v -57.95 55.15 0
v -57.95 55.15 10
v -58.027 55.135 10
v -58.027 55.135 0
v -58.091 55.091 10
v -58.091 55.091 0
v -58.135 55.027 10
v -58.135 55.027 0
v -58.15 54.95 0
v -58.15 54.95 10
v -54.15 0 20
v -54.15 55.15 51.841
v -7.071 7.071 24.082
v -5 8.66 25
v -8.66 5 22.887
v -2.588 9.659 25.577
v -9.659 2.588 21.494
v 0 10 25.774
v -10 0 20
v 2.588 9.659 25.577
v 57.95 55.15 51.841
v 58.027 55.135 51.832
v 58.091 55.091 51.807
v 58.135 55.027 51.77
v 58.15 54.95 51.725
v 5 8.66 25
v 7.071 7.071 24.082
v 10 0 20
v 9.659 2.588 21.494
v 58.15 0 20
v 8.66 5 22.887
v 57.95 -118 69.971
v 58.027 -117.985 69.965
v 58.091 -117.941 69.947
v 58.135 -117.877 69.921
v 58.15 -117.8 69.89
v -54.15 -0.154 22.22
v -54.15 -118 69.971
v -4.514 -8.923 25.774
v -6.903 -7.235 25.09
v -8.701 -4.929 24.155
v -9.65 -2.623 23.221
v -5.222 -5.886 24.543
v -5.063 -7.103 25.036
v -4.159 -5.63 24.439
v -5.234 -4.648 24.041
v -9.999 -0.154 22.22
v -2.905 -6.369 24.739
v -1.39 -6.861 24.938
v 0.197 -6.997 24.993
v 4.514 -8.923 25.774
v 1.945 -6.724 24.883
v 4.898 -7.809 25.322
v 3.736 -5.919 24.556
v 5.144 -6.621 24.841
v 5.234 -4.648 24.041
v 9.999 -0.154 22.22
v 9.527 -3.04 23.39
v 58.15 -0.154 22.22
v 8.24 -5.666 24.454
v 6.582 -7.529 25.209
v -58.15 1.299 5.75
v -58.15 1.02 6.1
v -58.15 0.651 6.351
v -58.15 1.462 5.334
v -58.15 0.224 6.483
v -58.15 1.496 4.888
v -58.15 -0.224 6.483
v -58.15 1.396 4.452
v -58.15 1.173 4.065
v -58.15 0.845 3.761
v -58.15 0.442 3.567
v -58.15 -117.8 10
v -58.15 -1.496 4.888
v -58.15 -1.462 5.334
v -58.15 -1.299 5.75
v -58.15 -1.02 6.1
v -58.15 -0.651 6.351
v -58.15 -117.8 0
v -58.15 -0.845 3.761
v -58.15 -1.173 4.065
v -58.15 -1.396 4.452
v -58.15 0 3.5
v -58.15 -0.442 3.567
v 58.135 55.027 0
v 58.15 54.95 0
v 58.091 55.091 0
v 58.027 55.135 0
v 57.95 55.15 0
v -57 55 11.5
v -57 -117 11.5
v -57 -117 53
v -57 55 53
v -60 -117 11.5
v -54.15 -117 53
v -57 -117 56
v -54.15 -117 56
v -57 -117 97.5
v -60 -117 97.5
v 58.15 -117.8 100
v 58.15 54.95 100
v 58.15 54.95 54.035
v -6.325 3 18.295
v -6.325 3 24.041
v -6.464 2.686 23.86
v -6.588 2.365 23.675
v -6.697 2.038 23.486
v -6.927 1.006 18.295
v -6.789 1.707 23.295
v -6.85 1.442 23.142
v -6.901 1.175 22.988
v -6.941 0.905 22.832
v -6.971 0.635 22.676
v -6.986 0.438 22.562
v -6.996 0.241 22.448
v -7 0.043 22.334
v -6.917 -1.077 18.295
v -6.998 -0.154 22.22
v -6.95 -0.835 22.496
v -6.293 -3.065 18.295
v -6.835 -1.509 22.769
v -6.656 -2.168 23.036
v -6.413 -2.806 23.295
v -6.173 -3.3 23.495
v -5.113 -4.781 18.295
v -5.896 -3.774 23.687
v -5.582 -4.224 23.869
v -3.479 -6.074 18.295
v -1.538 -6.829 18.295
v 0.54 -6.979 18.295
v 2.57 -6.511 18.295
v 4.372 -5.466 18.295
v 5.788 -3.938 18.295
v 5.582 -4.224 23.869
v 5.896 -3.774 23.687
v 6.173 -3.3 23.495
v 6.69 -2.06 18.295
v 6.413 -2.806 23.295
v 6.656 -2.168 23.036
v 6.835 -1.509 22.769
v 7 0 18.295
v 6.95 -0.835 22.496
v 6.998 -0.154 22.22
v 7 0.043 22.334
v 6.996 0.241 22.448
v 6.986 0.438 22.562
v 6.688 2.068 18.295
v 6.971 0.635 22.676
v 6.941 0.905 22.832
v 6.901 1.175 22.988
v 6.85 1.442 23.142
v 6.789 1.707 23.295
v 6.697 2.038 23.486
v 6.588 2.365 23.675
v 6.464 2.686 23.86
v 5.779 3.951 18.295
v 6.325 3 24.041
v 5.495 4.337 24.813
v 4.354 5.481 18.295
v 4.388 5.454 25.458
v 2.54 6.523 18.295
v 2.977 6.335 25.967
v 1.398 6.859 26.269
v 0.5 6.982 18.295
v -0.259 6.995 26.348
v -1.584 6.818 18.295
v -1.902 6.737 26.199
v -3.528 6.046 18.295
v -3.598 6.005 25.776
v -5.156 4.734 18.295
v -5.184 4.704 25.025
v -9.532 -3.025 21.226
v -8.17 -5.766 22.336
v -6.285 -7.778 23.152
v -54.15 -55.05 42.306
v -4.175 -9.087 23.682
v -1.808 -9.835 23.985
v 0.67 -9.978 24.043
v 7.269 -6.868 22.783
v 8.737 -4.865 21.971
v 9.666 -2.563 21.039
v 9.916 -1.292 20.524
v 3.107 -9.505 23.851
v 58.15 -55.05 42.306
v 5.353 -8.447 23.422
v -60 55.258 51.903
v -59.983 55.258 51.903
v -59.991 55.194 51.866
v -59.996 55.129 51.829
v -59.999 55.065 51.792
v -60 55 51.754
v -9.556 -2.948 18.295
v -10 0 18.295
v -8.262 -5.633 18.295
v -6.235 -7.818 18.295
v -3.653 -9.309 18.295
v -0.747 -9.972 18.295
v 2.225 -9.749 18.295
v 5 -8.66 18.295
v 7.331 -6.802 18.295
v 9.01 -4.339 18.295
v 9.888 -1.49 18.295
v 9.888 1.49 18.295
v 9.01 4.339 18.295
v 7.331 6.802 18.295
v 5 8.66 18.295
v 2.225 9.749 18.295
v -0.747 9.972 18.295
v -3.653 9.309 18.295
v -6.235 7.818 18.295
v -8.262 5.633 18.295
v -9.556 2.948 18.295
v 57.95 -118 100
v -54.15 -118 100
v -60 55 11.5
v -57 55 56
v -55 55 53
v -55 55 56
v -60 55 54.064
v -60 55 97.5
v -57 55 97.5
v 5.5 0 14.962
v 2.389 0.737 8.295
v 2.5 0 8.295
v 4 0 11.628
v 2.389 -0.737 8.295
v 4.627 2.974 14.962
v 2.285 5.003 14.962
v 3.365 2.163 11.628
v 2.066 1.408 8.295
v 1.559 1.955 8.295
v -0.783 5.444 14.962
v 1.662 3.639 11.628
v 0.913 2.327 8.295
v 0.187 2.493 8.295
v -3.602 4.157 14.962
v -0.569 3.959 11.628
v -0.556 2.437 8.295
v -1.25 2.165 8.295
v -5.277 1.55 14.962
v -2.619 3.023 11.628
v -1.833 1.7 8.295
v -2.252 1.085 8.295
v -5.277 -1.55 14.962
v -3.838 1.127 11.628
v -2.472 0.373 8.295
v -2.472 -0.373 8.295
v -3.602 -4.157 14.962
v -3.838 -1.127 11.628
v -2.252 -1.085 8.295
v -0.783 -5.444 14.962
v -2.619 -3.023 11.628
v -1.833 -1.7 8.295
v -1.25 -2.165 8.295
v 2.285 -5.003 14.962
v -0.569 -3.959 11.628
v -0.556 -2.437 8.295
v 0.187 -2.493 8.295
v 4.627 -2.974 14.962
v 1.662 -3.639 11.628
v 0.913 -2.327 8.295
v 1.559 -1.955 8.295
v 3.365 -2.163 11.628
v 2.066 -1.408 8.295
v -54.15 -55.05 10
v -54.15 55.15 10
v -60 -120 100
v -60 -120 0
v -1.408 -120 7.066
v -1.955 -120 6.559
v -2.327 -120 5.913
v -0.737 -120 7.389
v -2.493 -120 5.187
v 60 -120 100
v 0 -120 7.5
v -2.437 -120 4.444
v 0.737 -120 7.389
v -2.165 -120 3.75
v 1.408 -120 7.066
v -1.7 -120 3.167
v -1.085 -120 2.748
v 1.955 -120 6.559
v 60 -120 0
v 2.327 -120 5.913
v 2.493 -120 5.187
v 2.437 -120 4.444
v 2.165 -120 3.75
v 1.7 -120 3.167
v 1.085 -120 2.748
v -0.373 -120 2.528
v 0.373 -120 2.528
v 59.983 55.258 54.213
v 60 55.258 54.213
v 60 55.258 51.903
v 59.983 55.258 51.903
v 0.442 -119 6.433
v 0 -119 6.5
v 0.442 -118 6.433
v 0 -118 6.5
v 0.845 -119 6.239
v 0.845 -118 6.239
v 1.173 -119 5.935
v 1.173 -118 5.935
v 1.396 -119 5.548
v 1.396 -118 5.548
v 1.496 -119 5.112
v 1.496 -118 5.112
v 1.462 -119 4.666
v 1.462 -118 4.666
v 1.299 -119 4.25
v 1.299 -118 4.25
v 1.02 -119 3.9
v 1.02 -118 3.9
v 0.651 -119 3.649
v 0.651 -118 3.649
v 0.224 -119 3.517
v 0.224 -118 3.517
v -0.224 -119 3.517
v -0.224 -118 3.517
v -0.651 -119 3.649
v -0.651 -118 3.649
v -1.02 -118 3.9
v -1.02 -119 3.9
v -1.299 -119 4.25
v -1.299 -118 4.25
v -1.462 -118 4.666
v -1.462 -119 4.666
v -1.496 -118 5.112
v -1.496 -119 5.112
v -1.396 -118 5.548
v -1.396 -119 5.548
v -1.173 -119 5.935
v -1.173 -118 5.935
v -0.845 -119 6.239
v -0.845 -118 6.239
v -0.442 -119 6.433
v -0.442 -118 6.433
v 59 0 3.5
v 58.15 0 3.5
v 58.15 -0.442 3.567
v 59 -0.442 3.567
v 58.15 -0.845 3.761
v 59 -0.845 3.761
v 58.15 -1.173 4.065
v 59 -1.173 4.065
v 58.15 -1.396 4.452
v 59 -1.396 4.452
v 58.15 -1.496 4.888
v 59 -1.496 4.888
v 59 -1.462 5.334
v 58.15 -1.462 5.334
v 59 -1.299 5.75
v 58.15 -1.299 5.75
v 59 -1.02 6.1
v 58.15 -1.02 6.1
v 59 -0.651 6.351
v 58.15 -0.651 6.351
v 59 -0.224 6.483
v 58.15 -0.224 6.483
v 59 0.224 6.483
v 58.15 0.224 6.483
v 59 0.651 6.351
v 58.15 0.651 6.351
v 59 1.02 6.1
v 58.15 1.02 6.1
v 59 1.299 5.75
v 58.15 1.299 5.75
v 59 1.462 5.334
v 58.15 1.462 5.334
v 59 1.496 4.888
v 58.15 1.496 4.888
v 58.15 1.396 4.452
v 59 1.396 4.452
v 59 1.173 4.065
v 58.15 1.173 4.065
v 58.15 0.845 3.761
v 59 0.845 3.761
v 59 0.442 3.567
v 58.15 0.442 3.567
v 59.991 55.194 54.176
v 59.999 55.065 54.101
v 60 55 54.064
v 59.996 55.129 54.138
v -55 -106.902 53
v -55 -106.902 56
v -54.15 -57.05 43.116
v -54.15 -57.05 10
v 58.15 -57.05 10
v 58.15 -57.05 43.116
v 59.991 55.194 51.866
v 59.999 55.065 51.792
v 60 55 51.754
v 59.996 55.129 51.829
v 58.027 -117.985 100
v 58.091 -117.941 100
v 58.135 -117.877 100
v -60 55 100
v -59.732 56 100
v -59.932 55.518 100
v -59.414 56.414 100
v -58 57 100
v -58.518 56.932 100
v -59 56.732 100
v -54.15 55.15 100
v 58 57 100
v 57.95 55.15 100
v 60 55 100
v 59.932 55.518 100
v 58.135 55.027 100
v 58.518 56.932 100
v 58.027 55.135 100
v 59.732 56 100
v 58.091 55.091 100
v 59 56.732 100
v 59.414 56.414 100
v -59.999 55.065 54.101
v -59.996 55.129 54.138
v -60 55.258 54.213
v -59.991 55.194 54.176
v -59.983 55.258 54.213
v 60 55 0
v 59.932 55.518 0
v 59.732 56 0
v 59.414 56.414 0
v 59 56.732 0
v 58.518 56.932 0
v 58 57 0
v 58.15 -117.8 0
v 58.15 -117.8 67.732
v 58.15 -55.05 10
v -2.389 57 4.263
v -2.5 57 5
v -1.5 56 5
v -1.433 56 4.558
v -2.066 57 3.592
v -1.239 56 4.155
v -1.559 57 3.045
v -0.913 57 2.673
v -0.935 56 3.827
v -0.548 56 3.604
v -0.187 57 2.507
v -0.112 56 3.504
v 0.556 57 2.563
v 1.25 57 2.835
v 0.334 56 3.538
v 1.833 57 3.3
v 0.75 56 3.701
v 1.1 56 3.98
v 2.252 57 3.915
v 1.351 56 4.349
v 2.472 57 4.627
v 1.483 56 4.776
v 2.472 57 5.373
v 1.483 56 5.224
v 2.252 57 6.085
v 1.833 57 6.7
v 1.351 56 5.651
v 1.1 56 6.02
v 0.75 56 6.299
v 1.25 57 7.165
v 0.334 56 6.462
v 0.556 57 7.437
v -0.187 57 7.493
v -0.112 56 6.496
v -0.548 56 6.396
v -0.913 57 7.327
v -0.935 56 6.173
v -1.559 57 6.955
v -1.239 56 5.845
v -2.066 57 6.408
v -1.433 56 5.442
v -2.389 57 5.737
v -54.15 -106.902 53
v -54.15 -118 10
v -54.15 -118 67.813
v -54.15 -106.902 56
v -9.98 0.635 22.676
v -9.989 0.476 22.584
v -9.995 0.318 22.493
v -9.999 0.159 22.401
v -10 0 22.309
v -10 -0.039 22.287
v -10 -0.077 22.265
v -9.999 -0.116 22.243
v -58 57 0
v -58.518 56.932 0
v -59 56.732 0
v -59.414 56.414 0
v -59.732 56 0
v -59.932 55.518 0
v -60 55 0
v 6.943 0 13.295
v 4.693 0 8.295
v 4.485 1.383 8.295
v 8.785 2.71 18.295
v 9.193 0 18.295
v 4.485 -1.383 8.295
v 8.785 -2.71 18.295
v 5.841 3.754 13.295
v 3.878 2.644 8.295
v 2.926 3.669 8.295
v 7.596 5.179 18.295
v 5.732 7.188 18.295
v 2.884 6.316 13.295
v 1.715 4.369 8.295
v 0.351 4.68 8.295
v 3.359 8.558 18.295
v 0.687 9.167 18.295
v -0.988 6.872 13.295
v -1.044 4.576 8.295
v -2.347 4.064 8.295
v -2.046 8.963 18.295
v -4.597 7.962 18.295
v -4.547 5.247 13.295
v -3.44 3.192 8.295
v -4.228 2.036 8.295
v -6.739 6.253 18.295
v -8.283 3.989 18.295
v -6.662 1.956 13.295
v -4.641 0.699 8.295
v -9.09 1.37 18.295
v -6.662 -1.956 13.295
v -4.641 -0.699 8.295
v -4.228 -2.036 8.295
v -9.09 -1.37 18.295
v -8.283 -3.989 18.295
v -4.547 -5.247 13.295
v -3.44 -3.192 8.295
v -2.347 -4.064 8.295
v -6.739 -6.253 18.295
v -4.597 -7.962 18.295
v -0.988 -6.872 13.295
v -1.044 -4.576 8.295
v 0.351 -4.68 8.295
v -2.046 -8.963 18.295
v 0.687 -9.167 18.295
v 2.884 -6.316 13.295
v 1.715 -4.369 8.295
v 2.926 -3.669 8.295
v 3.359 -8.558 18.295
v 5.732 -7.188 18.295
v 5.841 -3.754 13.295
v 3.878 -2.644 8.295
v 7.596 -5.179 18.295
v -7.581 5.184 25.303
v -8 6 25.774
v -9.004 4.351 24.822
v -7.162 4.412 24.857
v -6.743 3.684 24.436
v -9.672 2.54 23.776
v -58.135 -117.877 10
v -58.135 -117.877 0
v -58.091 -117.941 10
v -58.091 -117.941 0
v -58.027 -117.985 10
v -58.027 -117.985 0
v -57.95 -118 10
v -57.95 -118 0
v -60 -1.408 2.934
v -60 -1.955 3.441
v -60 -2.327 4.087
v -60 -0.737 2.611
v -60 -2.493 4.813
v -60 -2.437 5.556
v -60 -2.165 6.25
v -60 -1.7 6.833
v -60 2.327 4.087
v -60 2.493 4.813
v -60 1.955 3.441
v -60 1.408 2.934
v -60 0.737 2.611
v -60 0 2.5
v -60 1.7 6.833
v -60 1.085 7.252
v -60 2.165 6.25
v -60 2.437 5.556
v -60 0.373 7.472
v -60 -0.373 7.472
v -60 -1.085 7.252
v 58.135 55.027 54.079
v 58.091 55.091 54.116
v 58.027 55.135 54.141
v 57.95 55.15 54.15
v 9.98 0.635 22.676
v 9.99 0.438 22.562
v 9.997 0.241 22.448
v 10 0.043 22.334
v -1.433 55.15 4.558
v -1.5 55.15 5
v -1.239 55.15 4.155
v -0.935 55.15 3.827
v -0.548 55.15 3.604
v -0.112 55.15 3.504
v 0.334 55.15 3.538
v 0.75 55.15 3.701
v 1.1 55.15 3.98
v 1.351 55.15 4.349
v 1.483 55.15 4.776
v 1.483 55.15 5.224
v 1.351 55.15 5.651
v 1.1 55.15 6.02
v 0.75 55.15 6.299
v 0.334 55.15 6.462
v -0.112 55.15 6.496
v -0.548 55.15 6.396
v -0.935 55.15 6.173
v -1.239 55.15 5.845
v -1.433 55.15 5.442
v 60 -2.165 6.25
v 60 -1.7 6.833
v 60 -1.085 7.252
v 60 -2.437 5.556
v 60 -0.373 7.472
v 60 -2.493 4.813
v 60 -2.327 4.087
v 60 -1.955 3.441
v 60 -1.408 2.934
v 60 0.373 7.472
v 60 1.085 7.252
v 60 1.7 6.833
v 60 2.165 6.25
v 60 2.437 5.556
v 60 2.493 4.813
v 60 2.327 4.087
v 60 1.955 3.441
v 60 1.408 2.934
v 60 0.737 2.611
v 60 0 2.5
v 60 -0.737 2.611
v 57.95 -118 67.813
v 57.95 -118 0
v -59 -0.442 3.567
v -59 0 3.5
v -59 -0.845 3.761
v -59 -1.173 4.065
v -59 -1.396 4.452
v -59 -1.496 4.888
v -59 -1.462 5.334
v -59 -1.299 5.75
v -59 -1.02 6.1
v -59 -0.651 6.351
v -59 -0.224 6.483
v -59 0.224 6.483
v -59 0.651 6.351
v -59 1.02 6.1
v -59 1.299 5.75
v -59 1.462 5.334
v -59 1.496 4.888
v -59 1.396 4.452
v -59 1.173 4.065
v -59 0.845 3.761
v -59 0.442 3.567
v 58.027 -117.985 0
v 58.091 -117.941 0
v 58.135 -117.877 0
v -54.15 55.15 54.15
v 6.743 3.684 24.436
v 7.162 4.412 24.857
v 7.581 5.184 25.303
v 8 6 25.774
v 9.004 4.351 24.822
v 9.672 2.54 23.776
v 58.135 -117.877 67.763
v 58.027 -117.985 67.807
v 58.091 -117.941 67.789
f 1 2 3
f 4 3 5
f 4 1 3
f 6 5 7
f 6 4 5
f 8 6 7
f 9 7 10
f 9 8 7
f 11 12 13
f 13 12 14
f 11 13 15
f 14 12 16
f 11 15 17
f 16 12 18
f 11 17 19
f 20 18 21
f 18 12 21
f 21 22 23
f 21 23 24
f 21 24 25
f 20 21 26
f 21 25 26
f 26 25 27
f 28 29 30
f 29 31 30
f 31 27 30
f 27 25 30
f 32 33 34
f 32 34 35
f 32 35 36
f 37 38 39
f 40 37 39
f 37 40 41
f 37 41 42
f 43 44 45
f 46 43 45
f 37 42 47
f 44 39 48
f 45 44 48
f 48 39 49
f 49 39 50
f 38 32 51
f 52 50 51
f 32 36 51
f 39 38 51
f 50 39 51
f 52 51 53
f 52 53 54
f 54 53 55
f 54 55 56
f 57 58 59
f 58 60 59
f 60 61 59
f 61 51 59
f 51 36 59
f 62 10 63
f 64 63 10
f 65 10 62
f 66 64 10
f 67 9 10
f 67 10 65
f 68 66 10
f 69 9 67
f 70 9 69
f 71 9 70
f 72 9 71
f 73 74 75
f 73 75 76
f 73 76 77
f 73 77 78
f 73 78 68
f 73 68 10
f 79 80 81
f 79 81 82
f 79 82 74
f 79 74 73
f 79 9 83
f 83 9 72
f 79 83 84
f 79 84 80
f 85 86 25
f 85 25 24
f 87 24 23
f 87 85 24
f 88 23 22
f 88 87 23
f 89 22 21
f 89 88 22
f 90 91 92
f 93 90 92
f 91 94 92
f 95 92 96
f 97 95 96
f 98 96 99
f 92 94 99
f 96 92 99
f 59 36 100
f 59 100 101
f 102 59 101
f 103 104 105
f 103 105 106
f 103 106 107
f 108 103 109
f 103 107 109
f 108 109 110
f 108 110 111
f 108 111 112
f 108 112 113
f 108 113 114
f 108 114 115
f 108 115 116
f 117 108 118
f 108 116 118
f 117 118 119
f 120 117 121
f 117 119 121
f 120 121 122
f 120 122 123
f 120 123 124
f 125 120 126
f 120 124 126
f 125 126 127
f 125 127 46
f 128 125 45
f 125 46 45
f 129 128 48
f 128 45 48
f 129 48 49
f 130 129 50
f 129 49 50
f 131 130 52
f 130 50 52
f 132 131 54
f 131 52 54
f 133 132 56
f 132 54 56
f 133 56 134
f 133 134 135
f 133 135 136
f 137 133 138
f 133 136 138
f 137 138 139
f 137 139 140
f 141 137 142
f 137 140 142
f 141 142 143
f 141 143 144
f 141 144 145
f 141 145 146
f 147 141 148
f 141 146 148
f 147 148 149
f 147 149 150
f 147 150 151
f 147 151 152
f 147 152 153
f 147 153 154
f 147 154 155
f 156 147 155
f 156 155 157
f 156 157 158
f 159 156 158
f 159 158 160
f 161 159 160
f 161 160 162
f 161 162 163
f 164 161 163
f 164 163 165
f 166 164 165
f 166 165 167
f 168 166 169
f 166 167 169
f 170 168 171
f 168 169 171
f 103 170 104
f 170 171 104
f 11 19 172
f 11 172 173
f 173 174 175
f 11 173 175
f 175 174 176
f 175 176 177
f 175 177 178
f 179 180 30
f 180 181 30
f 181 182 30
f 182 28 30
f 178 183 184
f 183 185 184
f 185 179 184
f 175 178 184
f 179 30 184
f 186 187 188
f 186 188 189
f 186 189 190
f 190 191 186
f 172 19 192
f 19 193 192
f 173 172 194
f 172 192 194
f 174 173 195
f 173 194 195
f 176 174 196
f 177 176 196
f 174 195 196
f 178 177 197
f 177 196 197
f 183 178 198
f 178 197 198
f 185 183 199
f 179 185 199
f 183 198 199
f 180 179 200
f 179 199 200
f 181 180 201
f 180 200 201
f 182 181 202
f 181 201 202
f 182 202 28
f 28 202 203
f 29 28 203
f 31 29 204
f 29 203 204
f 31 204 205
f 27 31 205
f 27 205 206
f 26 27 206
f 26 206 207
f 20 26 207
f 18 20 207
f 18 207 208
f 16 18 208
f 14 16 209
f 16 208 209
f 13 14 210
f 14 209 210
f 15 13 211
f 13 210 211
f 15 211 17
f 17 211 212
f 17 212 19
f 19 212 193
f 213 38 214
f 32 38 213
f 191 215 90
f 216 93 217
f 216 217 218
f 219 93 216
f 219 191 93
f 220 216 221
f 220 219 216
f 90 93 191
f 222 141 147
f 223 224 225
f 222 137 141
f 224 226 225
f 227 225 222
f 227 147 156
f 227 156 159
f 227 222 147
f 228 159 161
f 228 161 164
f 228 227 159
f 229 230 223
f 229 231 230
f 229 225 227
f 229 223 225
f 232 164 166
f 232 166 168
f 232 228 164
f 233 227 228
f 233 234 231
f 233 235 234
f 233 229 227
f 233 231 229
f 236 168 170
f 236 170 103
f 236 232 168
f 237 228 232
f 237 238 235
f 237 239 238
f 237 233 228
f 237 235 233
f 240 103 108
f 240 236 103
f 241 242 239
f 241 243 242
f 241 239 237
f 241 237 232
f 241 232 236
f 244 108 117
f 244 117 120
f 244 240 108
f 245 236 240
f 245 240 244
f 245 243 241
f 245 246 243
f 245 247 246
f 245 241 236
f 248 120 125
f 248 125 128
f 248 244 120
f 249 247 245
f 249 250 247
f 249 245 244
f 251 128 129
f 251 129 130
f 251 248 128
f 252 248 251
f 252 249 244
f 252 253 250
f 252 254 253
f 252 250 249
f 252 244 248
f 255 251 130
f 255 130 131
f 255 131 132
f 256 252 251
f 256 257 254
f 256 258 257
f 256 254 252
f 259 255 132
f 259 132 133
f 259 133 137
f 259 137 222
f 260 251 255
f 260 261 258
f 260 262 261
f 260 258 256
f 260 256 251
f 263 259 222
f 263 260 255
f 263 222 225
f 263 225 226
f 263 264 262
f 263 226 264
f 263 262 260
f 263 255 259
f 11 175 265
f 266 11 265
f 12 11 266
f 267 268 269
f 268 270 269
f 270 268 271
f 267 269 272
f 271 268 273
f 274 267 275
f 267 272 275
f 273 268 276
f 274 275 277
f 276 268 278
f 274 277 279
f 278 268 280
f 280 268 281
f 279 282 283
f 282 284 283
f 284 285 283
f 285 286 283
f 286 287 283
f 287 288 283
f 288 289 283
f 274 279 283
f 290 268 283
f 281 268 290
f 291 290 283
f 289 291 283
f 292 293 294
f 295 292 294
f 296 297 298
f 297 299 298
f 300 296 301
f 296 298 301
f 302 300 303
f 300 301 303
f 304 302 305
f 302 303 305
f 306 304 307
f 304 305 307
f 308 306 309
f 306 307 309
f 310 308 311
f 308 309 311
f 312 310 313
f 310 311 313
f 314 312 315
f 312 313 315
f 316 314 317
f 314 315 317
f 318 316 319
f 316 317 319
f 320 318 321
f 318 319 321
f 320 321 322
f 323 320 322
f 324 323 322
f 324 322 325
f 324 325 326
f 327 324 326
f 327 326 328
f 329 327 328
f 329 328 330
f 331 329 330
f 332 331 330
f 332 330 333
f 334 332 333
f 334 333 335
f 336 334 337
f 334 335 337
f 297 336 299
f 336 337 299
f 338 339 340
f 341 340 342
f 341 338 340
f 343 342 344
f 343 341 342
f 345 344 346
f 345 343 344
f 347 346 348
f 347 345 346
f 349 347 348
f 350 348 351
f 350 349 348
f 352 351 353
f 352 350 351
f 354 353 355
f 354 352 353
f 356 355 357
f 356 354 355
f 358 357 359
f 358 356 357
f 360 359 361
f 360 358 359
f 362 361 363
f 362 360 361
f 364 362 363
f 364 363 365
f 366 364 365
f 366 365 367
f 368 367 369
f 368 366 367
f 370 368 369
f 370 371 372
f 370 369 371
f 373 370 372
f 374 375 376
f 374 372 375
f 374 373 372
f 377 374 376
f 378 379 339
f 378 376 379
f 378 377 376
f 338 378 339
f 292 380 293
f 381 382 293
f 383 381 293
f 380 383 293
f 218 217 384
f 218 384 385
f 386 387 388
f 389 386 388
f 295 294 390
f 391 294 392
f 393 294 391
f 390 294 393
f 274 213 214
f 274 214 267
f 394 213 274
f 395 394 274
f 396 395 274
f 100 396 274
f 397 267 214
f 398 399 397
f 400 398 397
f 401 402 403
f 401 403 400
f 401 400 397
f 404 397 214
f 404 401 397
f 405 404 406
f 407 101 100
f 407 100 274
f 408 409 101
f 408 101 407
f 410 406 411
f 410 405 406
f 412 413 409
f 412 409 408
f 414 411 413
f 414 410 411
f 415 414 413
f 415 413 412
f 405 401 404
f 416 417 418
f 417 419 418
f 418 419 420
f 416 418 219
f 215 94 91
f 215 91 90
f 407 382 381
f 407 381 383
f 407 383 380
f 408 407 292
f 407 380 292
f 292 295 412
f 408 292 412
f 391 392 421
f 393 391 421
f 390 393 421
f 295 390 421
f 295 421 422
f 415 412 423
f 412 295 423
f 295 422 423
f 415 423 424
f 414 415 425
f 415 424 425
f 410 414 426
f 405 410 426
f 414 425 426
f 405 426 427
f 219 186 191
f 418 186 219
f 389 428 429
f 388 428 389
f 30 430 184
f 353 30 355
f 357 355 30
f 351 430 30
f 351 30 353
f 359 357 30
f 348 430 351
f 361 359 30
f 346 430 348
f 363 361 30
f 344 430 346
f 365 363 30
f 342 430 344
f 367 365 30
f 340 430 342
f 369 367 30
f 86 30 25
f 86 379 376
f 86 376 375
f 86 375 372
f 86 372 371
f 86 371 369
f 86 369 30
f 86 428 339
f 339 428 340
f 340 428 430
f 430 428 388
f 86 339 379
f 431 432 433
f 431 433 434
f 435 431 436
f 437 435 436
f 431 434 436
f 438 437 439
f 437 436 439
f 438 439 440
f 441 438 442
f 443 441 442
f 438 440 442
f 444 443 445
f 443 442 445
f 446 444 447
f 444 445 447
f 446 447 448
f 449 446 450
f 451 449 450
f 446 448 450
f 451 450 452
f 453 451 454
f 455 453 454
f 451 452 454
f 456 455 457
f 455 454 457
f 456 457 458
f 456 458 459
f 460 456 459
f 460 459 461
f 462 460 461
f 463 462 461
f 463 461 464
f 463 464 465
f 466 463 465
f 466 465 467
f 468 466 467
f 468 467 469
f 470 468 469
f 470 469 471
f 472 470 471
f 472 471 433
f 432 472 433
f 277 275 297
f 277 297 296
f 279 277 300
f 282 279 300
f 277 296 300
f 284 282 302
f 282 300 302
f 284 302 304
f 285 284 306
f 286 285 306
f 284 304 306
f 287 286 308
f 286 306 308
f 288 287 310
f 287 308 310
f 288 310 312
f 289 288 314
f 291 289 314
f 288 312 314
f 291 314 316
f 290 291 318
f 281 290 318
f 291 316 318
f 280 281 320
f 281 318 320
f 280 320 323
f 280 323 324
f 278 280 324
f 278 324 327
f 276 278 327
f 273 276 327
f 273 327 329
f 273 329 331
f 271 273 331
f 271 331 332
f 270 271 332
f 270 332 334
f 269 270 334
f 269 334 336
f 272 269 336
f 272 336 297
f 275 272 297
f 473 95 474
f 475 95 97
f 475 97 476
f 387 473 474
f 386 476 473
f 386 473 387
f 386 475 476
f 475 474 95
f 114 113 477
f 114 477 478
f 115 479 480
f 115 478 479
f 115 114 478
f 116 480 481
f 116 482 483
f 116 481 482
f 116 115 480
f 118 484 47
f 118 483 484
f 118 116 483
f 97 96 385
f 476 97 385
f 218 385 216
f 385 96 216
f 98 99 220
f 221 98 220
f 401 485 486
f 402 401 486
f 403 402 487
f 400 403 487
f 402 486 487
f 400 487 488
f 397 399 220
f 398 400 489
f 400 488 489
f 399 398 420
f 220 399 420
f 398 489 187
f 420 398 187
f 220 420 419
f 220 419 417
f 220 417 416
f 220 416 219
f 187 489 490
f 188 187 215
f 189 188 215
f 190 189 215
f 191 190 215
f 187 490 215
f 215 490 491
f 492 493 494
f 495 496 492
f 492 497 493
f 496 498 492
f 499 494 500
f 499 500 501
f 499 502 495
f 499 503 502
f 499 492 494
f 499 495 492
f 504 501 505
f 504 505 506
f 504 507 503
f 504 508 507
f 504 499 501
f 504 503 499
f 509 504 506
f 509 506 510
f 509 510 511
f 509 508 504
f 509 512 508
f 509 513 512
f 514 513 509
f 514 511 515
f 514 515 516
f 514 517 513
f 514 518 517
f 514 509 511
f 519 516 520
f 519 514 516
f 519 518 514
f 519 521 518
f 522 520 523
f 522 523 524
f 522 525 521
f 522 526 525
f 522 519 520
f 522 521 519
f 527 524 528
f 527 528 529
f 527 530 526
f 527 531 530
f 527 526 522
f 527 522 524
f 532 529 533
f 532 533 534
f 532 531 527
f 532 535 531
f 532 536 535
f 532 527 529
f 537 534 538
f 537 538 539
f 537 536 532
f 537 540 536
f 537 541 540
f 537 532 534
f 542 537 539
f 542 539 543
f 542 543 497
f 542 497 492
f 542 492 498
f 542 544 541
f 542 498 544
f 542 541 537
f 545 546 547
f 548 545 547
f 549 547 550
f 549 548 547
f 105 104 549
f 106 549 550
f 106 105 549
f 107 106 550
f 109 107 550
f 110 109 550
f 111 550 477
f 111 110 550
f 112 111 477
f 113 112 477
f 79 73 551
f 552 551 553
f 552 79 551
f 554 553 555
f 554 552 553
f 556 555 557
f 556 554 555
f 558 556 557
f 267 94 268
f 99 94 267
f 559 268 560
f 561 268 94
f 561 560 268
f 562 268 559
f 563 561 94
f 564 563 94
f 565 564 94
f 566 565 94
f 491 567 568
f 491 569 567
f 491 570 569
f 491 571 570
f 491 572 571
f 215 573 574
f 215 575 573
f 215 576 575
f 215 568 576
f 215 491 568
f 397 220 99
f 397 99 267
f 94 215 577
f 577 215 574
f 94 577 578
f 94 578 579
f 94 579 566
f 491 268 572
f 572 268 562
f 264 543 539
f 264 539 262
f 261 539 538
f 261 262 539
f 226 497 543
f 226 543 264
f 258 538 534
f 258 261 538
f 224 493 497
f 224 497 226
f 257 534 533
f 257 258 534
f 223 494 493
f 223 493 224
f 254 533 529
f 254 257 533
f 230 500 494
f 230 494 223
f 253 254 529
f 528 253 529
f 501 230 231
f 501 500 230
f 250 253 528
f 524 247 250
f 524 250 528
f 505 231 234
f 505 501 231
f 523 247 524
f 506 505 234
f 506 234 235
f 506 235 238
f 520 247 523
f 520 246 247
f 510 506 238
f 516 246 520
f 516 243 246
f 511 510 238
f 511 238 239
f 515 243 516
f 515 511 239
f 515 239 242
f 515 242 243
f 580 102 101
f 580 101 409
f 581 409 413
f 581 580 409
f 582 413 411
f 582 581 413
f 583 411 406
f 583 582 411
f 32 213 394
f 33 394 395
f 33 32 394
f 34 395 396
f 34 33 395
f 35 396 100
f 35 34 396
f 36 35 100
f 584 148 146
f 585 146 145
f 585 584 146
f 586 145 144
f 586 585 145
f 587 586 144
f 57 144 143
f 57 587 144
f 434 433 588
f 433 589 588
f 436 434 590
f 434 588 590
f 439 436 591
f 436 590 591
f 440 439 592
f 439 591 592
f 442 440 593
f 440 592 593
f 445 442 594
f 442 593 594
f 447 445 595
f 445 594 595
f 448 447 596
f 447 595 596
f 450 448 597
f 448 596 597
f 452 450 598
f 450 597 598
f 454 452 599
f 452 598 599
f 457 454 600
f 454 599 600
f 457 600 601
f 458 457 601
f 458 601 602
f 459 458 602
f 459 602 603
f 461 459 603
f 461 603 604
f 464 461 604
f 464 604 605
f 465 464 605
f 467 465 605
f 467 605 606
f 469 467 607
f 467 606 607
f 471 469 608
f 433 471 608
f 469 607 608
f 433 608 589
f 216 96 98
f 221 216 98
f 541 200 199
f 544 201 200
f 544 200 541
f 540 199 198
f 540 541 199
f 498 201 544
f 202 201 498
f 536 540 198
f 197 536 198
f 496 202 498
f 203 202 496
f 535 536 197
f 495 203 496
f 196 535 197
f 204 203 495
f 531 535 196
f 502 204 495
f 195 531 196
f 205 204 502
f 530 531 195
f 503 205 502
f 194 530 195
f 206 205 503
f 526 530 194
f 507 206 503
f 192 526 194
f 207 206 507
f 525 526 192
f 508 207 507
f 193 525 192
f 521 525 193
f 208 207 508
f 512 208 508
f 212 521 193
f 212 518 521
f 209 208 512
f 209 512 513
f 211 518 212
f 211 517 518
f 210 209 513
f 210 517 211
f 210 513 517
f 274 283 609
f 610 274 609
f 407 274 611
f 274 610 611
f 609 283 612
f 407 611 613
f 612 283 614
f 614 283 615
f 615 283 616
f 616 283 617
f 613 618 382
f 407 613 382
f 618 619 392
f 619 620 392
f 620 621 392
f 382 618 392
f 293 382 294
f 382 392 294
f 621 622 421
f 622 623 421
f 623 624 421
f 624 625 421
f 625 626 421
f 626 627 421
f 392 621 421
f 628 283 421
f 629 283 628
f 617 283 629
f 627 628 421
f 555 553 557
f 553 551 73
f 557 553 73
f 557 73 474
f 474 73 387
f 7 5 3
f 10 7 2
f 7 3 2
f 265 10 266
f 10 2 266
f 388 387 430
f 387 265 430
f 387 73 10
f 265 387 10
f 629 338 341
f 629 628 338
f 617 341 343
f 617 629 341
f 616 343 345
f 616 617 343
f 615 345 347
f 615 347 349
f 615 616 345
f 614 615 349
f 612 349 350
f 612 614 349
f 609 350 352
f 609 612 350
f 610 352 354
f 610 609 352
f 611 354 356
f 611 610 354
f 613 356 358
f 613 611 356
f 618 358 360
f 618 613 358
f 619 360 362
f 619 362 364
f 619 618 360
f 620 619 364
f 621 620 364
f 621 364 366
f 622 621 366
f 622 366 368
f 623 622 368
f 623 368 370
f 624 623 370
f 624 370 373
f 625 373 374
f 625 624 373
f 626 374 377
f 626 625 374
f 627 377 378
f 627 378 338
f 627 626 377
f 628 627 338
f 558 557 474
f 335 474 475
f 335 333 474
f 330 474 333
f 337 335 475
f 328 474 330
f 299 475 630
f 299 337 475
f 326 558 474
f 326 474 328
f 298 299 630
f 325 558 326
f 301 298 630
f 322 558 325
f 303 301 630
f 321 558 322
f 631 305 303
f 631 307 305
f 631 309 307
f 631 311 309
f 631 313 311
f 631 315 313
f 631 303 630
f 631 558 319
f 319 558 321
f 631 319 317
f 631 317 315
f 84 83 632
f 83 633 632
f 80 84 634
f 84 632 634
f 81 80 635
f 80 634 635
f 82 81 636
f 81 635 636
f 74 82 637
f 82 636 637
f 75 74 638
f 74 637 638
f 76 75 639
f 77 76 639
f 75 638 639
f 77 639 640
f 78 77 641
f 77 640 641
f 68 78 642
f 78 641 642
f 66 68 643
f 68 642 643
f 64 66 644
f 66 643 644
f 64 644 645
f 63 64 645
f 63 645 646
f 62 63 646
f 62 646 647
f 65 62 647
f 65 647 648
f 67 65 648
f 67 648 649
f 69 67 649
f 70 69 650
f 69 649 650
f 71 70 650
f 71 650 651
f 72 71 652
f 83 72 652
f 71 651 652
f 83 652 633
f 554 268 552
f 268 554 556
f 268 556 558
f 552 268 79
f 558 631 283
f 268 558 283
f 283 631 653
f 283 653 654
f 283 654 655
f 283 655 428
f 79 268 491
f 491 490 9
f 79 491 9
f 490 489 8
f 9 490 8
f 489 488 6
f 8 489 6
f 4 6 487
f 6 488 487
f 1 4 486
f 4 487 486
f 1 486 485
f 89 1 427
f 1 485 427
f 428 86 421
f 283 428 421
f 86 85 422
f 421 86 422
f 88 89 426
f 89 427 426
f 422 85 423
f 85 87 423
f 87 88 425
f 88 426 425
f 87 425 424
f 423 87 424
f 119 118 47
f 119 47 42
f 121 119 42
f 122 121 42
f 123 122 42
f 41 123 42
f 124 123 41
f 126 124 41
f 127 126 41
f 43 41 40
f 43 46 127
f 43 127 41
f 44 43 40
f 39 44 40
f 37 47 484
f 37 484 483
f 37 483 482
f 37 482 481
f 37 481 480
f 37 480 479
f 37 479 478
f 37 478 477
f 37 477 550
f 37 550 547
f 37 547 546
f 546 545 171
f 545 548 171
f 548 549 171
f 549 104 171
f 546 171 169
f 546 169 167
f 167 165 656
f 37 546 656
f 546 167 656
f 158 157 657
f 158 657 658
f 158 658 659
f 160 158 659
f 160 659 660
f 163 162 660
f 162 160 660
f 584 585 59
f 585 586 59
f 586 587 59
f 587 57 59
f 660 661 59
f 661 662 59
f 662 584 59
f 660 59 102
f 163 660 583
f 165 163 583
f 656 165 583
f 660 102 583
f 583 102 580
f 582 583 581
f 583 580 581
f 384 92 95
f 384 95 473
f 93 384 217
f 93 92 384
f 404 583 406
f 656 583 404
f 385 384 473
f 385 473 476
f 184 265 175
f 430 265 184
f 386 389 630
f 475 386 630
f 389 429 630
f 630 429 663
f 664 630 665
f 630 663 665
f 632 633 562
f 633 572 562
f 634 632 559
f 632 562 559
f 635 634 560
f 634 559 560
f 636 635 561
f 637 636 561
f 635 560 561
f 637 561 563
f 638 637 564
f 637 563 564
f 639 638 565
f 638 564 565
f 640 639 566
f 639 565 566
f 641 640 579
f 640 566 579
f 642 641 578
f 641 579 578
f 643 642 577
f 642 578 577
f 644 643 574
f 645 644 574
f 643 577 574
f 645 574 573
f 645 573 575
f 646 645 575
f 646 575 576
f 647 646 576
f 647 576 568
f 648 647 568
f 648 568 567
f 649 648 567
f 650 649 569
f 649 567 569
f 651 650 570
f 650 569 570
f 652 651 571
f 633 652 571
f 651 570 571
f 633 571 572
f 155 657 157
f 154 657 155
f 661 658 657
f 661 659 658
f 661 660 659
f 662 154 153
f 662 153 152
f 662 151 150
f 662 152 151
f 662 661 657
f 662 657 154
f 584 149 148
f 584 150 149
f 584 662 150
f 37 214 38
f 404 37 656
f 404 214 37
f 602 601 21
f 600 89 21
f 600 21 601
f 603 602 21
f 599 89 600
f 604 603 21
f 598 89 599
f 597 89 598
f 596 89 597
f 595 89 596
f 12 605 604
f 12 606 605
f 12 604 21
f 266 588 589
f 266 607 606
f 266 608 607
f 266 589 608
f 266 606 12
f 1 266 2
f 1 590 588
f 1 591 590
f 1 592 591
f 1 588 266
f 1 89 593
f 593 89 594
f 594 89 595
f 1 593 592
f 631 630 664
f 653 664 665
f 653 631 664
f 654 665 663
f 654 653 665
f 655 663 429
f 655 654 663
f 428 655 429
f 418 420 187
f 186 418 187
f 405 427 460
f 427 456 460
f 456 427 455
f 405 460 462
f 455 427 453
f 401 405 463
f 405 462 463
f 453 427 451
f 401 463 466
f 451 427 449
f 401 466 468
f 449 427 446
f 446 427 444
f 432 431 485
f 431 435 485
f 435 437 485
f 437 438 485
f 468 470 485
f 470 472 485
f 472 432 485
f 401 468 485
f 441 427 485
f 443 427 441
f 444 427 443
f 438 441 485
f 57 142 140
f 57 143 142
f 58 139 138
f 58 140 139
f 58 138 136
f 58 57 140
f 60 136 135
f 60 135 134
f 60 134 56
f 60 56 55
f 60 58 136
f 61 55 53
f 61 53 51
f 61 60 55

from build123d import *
from build123d.topology import SkipClean

# Parameters (mm, degrees)
SALIENTE_EXTRUIR1_DEPTH                              = 100
SALIENTE_EXTRUIR3_DEPTH                              = 60
CROQUIS8_R                                           = 7
CORTAR_EXTRUIR2_DEPTH                                = 7.5
CORTAR_EXTRUIR3_DEPTH                                = 25
SALIENTE_EXTRUIR5_REACH                              = 169.332
CROQUIS12_W                                          = 116.3
CROQUIS12_H                                          = 2
AVELLANADO_PARA_TORNILLO_CON_CABEZA_2_D              = 3
AVELLANADO_PARA_TORNILLO_CON_CABEZA_2_DEPTH          = 10
AVELLANADO_PARA_TORNILLO_CON_CABEZA_2_CSINK_D        = 5
AVELLANADO_PARA_TORNILLO_CON_CABEZA_2_CSINK_ANGLE    = 90
AVELLANADO_PARA_TORNILLO_CON_CABEZA_2_TIP            = 0.901290929
AVELLANADO_PARA_TORNILLO_CON_CABEZA_2_ON_D           = 3
AVELLANADO_PARA_TORNILLO_CON_CABEZA_2_ON_DEPTH       = 10
AVELLANADO_PARA_TORNILLO_CON_CABEZA_2_ON_CSINK_D     = 5
AVELLANADO_PARA_TORNILLO_CON_CABEZA_2_ON_CSINK_ANGLE = 90
AVELLANADO_PARA_TORNILLO_CON_CABEZA_2_ON_TIP         = 0.901290929
CROQUIS18_R                                          = 10
CROQUIS18_R_2                                        = 3.723403092
CORTAR_EXTRUIR6_DEPTH                                = 10
CROQUIS21_W                                          = 4
CROQUIS21_H                                          = 173.15
SALIENTE_EXTRUIR6_DEPTH                              = 90
CROQUIS22_W                                          = 86
CROQUIS22_H                                          = 172
CORTAR_EXTRUIR7_DEPTH                                = 3
CROQUIS23_W                                          = 3
CROQUIS23_H                                          = 172
CORTAR_EXTRUIR8_DEPTH                                = 2
CORTAR_EXTRUIR9_REACH                                = 195.972
CROQUIS24_W                                          = 3
CROQUIS24_H                                          = 10.09778391
CROQUIS25_W                                          = 116.3
CROQUIS25_H                                          = 2
CORTAR_EXTRUIR10_DEPTH                               = 10


# Read off the part's stored shape, not the designer's step: Recubrir-Lámina1
with BuildPart() as part:
    # Croquis1 → Saliente-Extruir1 (new body)
    with BuildSketch(Plane.XY):
        with BuildLine():
            Line((60, -120), (60, 55))
            ThreePointArc((60, 55), (59.414213562, 56.414213562), (58, 57))
            Line((58, 57), (-58, 57))
            ThreePointArc((-58, 57), (-59.414213562, 56.414213562), (-60, 55))
            Line((-60, 55), (-60, -120))
            Line((-60, -120), (60, -120))
        make_face()
        with BuildLine():
            Line((-57.95, -118), (57.95, -118))
            ThreePointArc((57.95, -118), (58.091421356, -117.941421356), (58.15, -117.8))
            Line((58.15, -117.8), (58.15, 54.95))
            ThreePointArc((58.15, 54.95), (58.091421356, 55.091421356), (57.95, 55.15))
            Line((57.95, 55.15), (-57.95, 55.15))
            ThreePointArc((-57.95, 55.15), (-58.091421356, 55.091421356), (-58.15, 54.95))
            Line((-58.15, 54.95), (-58.15, -117.8))
            ThreePointArc((-58.15, -117.8), (-58.091421356, -117.941421356), (-57.95, -118))
        make_face(mode=Mode.SUBTRACT)
    extrude(amount=SALIENTE_EXTRUIR1_DEPTH)

    # Croquis2 → Saliente-Extruir3 (add, symmetric)
    with BuildSketch(Plane(origin=(0, 0, 0), x_dir=(0, 0, -1), z_dir=(1, 0, 0))):
        Polygon((-51.903464864, 55.258422081), (-20, 0), (-67.842054117, -118.071815959), (-70, -118.071815959), (-22.220404934, -0.154145841), (-54.21286594, 55.258422081), align=None)
    extrude(amount=SALIENTE_EXTRUIR3_DEPTH, both=True)

    # Croquis6 → Revolución1 (revolve)
    with BuildSketch(Plane(origin=(0, 0, 0), x_dir=(0, 0, -1), z_dir=(1, 0, 0)), mode=Mode.PRIVATE) as revoluci_n1_sk:
        Polygon((-24.041451884, 7), (-25.773502692, 10), (-18.294962095, 10), (-18.294962095, 8), (-8.294962095, 8), (-8.294962095, 5), (-23.294962095, 5), (-23.294962095, 7), align=None)
    revolve(revoluci_n1_sk.sketch.rotate(Axis((0, 0, -70), (0, 0, 1)), 90), axis=Axis((0, 0, -70), (0, 0, 1)))

    # Croquis8 → Cortar-Extruir2 (cut, symmetric)
    with SkipClean():  # the faces are left unmerged after this step: merging them gives an invalid solid
        with BuildSketch(Plane.XY.offset(23.294962095)):
            with Locations(Location((0, 0, 0), (0, 0, 154.623066475))):
                Circle(CROQUIS8_R)
        extrude(amount=CORTAR_EXTRUIR2_DEPTH, both=True, mode=Mode.SUBTRACT)

    # Croquis10 → Cortar-Extruir3 (cut, symmetric)
    with BuildSketch(Plane(origin=(0, 0, 0), x_dir=(0, 0, -1), z_dir=(1, 0, 0))):
        Polygon((-29.700523202, 12.801799046), (-22.675993136, 0.634956072), (-22.220404934, -0.154145841), (-27.761841087, -13.830135337), (-29.486165756, -12.415050666), align=None)
    extrude(amount=CORTAR_EXTRUIR3_DEPTH, both=True, mode=Mode.SUBTRACT)

    # Saliente-Extruir5: up to this plane
    saliente_extruir5_end = Plane(origin=(60, 0, 20), z_dir=(0, 0.3755372500045795, 0.9268073013625854))
    # Croquis12 → Saliente-Extruir5 (add, up to the surface)
    with BuildSketch(Plane.XY, mode=Mode.PRIVATE) as saliente_extruir5_sk1:
        with Locations((0, -56.05)):
            Rectangle(CROQUIS12_W, CROQUIS12_H)
    saliente_extruir5_tool1 = split(extrude(saliente_extruir5_sk1.sketch, amount=SALIENTE_EXTRUIR5_REACH, mode=Mode.PRIVATE), bisect_by=saliente_extruir5_end, keep=Keep.BOTH, mode=Mode.PRIVATE)
    add(saliente_extruir5_tool1.solids().sort_by_distance((0, -56.05, 0))[0])

    # Croquis14 → Avellanado para tornillo con cabeza elev (revolve, cut)
    with BuildSketch(Plane(origin=(60, 0, 5), x_dir=(0, 0, -1), z_dir=(0, 1, 0))):
        Polygon((0, 0), (0, 10.901290929), (1.5, 10), (1.5, 1), (2.5, 0), align=None)
    avellanado_para_tornillo_con_cabeza_elev = revolve(axis=Axis((66.35, 0, 5), (-1, 0, 0)), mode=Mode.SUBTRACT)

    # Simetría1: Avellanado para tornillo con cabeza elev across plane
    add(avellanado_para_tornillo_con_cabeza_elev.mirror(Plane(origin=(0, 0, 0), x_dir=(0, 0, 1), z_dir=(1, 0, 0))), mode=Mode.SUBTRACT)

    # Avellanado para tornillo con cabeza  2
    with Locations(Plane(origin=(0, 57, 5), x_dir=(1, 0, 0), z_dir=(0, 1, 0))):
        with Locations((0, 0)):
            CounterSinkHole(AVELLANADO_PARA_TORNILLO_CON_CABEZA_2_D / 2, AVELLANADO_PARA_TORNILLO_CON_CABEZA_2_CSINK_D / 2, depth=AVELLANADO_PARA_TORNILLO_CON_CABEZA_2_DEPTH, counter_sink_angle=AVELLANADO_PARA_TORNILLO_CON_CABEZA_2_CSINK_ANGLE)
            with Locations((0, 0, -(AVELLANADO_PARA_TORNILLO_CON_CABEZA_2_DEPTH + AVELLANADO_PARA_TORNILLO_CON_CABEZA_2_TIP / 2))):  # 118° drill point
                Cone(0, AVELLANADO_PARA_TORNILLO_CON_CABEZA_2_D / 2, AVELLANADO_PARA_TORNILLO_CON_CABEZA_2_TIP, mode=Mode.SUBTRACT)

    # Avellanado para tornillo con cabeza 2 on
    with Locations(Plane(origin=(0, -120, 5), x_dir=(0, 0, -1), z_dir=(0, -1, 0))):
        with Locations((0, 0)):
            CounterSinkHole(AVELLANADO_PARA_TORNILLO_CON_CABEZA_2_ON_D / 2, AVELLANADO_PARA_TORNILLO_CON_CABEZA_2_ON_CSINK_D / 2, depth=AVELLANADO_PARA_TORNILLO_CON_CABEZA_2_ON_DEPTH, counter_sink_angle=AVELLANADO_PARA_TORNILLO_CON_CABEZA_2_ON_CSINK_ANGLE)
            with Locations((0, 0, -(AVELLANADO_PARA_TORNILLO_CON_CABEZA_2_ON_DEPTH + AVELLANADO_PARA_TORNILLO_CON_CABEZA_2_ON_TIP / 2))):  # 118° drill point
                Cone(0, AVELLANADO_PARA_TORNILLO_CON_CABEZA_2_ON_D / 2, AVELLANADO_PARA_TORNILLO_CON_CABEZA_2_ON_TIP, mode=Mode.SUBTRACT)

    # Croquis18 → Cortar-Extruir6 (cut)
    with BuildSketch(Plane(origin=(0, 0, 8.294962095), x_dir=(-1, 0, 0), z_dir=(0, 0, -1))):
        Circle(CROQUIS18_R)
        Circle(CROQUIS18_R_2, mode=Mode.SUBTRACT)
    extrude(amount=-CORTAR_EXTRUIR6_DEPTH, mode=Mode.SUBTRACT)

    # Recubrir-Lámina1 outline → Recubrir-Lámina1 (revolve)
    with BuildSketch(Plane.XZ):
        Polygon((7, 18.294962095), (2.5, 8.294962095), (4.69317122, 8.294962095), (9.19317122, 18.294962095), align=None)
    revolve(axis=Axis((0, 0, 0), (0, 0, 1)))

    # Croquis21 → Saliente-Extruir6 (add)
    with BuildSketch(Plane.XY.offset(100)):
        with Locations((-56.15, -31.425)):
            Rectangle(CROQUIS21_W, CROQUIS21_H)
    extrude(amount=-SALIENTE_EXTRUIR6_DEPTH)

    # Croquis22 → Cortar-Extruir7 (cut)
    with BuildSketch(Plane.ZY.offset(60)):
        with Locations((54.5, -31)):
            Rectangle(CROQUIS22_W, CROQUIS22_H)
    extrude(amount=-CORTAR_EXTRUIR7_DEPTH, mode=Mode.SUBTRACT)

    # Croquis23 → Cortar-Extruir8 (cut)
    with BuildSketch(Plane.ZY.offset(57)):
        with Locations((54.5, -31)):
            Rectangle(CROQUIS23_W, CROQUIS23_H)
    extrude(amount=-CORTAR_EXTRUIR8_DEPTH, mode=Mode.SUBTRACT)

    # Croquis24 → Cortar-Extruir9 (cut, up to next)
    with BuildSketch(Plane.ZY.offset(55), mode=Mode.PRIVATE) as cortar_extruir9_sk1:
        with Locations((54.5, -111.951108045)):
            Rectangle(CROQUIS24_W, CROQUIS24_H)
    cortar_extruir9_tool1 = extrude(cortar_extruir9_sk1.sketch, amount=-CORTAR_EXTRUIR9_REACH, mode=Mode.PRIVATE) & part.part
    add(cortar_extruir9_tool1.solids().sort_by_distance((-55, -111.951108, 54.5))[0], mode=Mode.SUBTRACT)

    # Croquis25 → Cortar-Extruir10 (cut)
    with BuildSketch(Plane(origin=(0, 0, 0), x_dir=(-1, 0, 0), z_dir=(0, 0, -1))):
        with Locations((0, -56.05)):
            Rectangle(CROQUIS25_W, CROQUIS25_H)
    extrude(amount=-CORTAR_EXTRUIR10_DEPTH, mode=Mode.SUBTRACT)


solid = part.part
